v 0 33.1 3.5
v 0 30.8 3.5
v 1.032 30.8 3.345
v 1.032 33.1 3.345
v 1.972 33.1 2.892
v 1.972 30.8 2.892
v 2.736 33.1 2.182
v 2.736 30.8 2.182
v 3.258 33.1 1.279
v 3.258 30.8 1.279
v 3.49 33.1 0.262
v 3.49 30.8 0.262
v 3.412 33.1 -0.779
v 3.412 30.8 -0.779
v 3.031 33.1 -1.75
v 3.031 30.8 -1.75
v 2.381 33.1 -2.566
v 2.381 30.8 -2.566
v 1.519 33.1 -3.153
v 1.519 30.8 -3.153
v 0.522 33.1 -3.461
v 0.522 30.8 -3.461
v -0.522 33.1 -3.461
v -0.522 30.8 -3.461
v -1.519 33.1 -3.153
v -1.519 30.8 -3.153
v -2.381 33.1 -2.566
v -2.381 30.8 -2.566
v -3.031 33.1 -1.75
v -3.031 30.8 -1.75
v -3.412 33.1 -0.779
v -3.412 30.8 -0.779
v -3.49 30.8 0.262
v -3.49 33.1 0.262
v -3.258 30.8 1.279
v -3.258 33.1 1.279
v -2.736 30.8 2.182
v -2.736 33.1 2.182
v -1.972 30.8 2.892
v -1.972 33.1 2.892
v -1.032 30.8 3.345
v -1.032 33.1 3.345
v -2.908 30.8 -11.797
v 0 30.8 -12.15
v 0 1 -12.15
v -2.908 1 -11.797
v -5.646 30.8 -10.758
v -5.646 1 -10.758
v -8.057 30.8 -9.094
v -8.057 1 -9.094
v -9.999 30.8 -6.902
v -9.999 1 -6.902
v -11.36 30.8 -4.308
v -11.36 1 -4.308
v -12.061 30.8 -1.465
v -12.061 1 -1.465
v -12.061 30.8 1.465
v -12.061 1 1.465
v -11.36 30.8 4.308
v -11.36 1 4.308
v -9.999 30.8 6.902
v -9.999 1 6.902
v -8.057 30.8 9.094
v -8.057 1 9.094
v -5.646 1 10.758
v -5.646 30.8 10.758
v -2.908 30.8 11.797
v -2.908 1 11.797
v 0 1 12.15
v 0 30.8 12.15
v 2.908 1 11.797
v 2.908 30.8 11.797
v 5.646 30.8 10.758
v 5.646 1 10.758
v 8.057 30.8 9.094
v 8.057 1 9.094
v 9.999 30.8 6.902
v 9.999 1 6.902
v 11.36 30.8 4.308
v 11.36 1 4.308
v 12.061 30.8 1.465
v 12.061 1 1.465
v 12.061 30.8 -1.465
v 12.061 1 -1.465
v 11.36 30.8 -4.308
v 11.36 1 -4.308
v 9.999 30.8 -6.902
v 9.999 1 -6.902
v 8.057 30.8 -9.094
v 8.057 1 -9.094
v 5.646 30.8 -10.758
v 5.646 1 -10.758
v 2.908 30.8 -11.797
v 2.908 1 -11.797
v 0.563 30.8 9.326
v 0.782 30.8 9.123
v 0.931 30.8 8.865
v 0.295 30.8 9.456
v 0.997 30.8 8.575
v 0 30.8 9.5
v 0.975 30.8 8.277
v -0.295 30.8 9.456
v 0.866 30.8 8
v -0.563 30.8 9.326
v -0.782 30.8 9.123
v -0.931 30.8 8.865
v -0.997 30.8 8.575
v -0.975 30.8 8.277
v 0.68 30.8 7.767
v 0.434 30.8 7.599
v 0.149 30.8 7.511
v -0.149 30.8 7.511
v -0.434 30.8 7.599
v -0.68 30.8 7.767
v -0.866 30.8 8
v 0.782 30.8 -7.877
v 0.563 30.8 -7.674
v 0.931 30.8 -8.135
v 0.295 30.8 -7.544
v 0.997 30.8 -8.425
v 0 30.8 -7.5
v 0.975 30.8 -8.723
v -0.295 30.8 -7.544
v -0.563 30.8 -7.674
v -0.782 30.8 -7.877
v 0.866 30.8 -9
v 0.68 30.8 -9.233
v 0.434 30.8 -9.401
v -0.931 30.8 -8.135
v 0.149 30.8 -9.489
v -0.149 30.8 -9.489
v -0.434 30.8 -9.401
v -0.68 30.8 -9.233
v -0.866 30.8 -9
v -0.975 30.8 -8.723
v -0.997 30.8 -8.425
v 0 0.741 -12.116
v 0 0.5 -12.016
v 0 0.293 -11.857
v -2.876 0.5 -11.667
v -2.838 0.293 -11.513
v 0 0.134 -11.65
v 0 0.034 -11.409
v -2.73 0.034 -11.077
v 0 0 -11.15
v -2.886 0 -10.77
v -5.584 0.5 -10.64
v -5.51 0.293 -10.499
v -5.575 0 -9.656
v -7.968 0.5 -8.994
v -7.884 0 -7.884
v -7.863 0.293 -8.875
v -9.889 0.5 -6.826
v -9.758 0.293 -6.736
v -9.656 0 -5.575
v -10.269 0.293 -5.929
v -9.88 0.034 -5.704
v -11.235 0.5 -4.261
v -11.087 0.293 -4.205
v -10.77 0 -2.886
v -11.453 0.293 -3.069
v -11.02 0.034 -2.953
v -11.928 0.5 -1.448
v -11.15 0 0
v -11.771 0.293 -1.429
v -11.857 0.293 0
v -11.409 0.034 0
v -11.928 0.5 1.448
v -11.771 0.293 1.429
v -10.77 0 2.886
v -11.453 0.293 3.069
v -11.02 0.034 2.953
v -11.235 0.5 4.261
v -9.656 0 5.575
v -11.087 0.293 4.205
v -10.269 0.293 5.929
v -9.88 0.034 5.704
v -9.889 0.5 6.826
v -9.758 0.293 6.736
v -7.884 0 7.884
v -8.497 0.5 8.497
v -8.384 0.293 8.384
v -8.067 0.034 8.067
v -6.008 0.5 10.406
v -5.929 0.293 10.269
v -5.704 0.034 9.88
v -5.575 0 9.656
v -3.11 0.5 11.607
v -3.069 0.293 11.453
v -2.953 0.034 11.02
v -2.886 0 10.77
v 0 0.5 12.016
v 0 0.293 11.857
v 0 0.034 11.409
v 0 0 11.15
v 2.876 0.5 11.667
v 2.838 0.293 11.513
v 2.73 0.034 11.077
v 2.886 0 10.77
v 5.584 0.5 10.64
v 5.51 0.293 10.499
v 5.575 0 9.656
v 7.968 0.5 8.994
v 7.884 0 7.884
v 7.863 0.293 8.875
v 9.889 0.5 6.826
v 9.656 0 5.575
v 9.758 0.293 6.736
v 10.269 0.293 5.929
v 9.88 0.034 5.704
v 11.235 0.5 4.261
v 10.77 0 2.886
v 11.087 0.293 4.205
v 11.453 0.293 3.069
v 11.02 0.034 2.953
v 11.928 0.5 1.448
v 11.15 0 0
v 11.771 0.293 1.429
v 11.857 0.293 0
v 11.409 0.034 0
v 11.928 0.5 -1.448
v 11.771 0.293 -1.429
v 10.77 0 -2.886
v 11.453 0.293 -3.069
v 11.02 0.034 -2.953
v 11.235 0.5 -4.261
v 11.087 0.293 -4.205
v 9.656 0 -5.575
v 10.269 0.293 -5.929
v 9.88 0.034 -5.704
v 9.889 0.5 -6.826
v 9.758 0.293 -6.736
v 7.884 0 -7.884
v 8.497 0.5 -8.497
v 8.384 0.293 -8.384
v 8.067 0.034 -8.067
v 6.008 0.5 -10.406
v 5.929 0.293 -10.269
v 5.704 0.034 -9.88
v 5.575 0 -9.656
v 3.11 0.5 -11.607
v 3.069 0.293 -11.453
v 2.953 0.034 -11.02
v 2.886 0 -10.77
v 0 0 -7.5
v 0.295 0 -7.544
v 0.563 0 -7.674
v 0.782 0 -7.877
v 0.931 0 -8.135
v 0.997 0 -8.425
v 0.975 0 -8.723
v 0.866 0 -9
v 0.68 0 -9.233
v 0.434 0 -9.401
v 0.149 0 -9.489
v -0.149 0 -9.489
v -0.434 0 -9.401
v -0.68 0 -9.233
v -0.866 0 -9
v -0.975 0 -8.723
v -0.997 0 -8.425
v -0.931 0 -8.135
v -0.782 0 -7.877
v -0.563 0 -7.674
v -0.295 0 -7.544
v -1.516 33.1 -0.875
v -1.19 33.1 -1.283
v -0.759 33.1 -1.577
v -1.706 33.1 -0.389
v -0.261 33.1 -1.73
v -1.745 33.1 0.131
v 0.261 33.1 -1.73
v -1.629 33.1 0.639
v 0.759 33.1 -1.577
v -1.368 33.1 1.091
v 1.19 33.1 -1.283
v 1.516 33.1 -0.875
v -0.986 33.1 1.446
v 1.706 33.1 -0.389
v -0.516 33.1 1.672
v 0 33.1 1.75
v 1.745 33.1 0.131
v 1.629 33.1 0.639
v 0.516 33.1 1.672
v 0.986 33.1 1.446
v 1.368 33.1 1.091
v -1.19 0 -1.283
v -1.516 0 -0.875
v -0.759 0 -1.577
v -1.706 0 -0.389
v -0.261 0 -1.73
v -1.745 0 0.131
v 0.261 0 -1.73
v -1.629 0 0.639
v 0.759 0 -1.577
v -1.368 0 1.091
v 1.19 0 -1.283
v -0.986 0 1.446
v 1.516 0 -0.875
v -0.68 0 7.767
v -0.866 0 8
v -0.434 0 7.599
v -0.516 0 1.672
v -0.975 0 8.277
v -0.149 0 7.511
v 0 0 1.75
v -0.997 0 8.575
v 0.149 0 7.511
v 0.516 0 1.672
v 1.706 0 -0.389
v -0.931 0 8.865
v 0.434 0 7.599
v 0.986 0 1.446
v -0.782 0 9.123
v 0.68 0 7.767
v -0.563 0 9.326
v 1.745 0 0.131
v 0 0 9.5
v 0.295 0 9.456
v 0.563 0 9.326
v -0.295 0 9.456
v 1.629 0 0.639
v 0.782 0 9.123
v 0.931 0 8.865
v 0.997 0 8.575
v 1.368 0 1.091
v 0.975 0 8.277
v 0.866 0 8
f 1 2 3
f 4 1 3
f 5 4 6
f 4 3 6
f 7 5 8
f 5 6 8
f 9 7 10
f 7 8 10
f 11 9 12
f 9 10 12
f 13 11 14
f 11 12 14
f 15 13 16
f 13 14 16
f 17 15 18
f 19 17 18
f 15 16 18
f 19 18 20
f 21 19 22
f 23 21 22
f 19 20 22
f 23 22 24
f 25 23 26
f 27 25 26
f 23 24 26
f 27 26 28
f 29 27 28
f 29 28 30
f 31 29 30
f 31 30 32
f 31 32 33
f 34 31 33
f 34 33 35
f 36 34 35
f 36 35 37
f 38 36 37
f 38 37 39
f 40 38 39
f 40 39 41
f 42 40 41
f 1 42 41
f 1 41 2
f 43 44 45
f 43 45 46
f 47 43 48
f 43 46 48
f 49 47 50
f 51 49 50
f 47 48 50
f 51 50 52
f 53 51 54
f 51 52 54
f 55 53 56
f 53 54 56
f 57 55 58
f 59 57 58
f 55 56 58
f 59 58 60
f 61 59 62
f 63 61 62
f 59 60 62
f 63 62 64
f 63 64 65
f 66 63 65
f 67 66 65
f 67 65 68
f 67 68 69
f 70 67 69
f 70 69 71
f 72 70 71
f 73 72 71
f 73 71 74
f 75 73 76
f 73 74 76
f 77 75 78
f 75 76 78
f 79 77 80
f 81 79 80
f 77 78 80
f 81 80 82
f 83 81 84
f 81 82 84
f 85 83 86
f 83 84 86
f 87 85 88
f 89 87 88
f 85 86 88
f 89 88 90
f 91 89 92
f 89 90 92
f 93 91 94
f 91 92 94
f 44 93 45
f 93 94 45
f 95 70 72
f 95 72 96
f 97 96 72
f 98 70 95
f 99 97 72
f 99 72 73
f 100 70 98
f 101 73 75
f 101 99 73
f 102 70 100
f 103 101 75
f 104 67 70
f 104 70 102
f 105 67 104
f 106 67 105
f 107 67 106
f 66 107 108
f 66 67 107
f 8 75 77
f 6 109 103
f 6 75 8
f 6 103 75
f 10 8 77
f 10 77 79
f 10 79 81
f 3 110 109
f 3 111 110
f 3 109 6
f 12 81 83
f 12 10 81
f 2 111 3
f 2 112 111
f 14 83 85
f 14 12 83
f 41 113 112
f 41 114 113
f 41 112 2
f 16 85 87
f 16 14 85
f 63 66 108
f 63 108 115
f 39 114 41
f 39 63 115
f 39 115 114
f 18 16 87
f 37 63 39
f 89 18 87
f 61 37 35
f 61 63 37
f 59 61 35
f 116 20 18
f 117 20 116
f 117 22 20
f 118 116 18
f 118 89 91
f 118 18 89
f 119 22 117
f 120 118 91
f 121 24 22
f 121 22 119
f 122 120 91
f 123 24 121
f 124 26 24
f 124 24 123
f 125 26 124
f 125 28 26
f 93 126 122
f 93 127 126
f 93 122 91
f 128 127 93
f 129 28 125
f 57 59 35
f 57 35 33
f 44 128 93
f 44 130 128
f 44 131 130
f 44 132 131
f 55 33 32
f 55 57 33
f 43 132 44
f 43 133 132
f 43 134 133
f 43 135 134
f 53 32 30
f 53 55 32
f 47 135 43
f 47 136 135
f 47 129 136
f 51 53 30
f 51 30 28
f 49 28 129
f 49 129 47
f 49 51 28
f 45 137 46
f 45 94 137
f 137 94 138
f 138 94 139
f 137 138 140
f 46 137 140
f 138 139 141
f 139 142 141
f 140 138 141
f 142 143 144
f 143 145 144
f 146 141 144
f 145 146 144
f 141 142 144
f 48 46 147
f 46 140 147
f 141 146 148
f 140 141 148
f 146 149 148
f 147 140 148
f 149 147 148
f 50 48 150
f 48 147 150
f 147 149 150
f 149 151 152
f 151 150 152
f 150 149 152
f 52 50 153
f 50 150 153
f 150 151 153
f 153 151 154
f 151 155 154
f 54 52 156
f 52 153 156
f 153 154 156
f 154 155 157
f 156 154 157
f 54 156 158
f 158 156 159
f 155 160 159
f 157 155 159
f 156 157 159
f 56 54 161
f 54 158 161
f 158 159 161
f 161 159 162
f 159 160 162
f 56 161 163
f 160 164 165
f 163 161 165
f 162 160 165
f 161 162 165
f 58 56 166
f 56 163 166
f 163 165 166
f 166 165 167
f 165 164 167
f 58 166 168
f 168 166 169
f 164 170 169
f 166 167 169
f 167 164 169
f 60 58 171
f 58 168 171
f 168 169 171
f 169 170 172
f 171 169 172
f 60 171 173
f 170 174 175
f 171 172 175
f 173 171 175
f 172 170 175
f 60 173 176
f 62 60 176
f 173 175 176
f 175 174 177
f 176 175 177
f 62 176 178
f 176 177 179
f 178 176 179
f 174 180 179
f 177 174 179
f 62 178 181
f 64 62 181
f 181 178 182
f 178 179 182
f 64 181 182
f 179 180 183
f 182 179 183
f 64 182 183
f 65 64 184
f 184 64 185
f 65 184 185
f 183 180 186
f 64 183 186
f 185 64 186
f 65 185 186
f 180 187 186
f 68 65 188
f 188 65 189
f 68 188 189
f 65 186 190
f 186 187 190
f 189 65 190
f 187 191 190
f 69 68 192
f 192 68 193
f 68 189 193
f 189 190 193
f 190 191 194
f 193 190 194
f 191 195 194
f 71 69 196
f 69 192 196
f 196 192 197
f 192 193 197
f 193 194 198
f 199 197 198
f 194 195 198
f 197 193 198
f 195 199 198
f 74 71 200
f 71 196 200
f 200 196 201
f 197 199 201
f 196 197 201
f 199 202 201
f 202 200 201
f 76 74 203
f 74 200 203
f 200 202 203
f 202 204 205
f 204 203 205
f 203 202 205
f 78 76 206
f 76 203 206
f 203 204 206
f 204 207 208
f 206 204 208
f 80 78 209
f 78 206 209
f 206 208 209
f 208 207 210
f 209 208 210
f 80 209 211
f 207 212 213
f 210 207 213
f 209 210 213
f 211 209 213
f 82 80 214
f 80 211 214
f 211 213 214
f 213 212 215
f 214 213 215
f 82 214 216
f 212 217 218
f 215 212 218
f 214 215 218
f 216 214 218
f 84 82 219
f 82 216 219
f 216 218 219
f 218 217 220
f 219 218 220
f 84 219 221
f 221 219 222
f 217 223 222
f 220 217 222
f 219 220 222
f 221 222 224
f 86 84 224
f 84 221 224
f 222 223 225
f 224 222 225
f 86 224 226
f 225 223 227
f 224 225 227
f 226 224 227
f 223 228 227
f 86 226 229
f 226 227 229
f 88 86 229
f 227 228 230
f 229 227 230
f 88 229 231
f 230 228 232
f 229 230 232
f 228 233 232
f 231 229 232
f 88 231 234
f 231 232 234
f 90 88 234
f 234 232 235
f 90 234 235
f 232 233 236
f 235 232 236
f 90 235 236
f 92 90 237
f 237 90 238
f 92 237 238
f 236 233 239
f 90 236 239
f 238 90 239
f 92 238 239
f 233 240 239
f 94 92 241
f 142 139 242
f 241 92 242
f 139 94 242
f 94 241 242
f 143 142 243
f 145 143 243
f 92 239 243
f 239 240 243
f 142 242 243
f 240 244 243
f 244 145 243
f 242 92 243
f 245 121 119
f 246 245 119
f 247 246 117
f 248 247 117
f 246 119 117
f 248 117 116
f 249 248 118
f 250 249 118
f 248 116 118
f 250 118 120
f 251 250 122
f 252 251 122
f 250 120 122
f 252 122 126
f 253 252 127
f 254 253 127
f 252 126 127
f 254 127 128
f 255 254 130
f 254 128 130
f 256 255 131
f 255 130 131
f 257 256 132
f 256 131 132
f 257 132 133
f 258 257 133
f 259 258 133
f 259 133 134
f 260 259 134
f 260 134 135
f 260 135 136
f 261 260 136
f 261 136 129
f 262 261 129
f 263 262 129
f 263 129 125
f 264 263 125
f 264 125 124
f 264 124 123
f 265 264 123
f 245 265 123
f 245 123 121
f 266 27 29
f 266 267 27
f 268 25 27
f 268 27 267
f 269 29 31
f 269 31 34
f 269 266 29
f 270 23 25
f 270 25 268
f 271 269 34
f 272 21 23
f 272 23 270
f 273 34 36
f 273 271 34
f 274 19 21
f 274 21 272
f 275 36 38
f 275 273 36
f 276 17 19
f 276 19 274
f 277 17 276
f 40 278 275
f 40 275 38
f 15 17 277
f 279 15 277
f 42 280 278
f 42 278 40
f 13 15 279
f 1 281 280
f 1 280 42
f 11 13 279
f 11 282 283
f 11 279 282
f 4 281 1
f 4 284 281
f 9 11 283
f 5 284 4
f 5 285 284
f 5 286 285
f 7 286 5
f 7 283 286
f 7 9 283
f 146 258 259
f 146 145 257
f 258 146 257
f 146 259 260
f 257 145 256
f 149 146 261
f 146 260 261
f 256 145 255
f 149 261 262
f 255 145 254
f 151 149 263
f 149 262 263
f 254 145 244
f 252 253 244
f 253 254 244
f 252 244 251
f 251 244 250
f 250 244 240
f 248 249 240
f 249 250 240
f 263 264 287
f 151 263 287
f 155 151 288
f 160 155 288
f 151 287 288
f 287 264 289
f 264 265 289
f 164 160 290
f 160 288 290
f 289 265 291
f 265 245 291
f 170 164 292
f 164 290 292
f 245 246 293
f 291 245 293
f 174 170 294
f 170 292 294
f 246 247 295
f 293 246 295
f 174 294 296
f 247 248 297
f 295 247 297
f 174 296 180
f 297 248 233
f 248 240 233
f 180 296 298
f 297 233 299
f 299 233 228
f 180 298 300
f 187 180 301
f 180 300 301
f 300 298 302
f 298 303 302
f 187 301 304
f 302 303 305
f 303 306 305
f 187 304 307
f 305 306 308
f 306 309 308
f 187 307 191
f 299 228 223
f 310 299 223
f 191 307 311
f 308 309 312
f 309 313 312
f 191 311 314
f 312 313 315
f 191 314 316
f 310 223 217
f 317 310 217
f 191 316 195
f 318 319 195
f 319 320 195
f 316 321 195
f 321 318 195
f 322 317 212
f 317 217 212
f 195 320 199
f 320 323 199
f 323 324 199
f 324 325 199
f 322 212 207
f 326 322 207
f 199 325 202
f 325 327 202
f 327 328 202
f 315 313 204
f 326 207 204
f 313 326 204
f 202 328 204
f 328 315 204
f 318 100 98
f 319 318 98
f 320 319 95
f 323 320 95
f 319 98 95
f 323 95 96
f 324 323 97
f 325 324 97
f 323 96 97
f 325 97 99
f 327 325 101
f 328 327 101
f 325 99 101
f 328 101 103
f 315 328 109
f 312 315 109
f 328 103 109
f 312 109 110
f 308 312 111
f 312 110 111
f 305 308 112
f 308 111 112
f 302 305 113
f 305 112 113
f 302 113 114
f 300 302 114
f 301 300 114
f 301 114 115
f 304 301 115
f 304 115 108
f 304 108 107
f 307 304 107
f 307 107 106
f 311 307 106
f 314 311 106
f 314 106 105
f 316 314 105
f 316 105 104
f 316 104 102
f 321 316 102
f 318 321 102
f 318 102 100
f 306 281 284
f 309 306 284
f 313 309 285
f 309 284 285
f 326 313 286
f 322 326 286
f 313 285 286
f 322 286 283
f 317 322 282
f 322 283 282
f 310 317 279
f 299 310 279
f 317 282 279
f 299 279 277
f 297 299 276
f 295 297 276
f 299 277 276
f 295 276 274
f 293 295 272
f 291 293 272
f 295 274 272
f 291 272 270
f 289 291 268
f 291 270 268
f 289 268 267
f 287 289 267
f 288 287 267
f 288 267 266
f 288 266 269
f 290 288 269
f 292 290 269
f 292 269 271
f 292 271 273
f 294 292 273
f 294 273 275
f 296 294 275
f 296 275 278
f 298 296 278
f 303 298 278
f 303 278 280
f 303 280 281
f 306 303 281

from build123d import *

# Parameters (mm, degrees)
SKETCH_1_R           = 12.15
EXTRUDE_1_DEPTH      = 30.8
FILLET_1_R           = 1
EXTRUDE_2_DEPTH      = 2.3
EXTRUDE_2_DEPTH_BACK = 30.8
SKETCH_2_R           = 3.5
SKETCH_3_R           = 1
CUT_EXTRUDE_1_DEPTH  = 36.268753911
SKETCH_4_R           = 1.75
CUT_EXTRUDE_2_DEPTH  = 38.294168478


with BuildPart() as part:
    # 草图1 → 凸台-拉伸1 (new body)
    with BuildSketch(Plane(origin=(0, 0, 0), x_dir=(1, 0, 0), z_dir=(0, 1, 0))):
        with Locations(Location((0, 0, 0), (0, 0, 90))):
            Circle(SKETCH_1_R)
    extrude(amount=EXTRUDE_1_DEPTH)

    # 圆角1
    fillet_1_edges = [part.edges().sort_by_distance(p)[0] for p in [
        (0, 0, 12.15),
    ]]
    fillet(fillet_1_edges, radius=FILLET_1_R)

    # 草图2 → 凸台-拉伸2 (add, two sides: drawn at the far end of the back side and taken through both)
    with BuildSketch(Plane(origin=(0, 30.8, 0), x_dir=(1, 0, 0), z_dir=(0, 1, 0)).offset(-EXTRUDE_2_DEPTH_BACK)):
        with Locations(Location((0, 0, 0), (0, 0, 270))):
            Circle(SKETCH_2_R)
    extrude(amount=EXTRUDE_2_DEPTH + EXTRUDE_2_DEPTH_BACK)

    # 草图3 → 切除-拉伸1 (cut, through all)
    with BuildSketch(Plane(origin=(0, 30.8, 0), x_dir=(1, 0, 0), z_dir=(0, 1, 0))):
        with Locations(Location((0, 8.5, 0), (0, 0, 270))):
            Circle(SKETCH_3_R)
        with Locations(Location((0, -8.5, 0), (0, 0, 270))):
            Circle(SKETCH_3_R)
    extrude(amount=-CUT_EXTRUDE_1_DEPTH, mode=Mode.SUBTRACT)

    # 草图4 → 切除-拉伸2 (cut, through all)
    with BuildSketch(Plane(origin=(0, 33.1, 0), x_dir=(1, 0, 0), z_dir=(0, 1, 0))):
        with Locations(Location((0, 0, 0), (0, 0, 270))):
            Circle(SKETCH_4_R)
    extrude(amount=-CUT_EXTRUDE_2_DEPTH, mode=Mode.SUBTRACT)


solid = part.part
